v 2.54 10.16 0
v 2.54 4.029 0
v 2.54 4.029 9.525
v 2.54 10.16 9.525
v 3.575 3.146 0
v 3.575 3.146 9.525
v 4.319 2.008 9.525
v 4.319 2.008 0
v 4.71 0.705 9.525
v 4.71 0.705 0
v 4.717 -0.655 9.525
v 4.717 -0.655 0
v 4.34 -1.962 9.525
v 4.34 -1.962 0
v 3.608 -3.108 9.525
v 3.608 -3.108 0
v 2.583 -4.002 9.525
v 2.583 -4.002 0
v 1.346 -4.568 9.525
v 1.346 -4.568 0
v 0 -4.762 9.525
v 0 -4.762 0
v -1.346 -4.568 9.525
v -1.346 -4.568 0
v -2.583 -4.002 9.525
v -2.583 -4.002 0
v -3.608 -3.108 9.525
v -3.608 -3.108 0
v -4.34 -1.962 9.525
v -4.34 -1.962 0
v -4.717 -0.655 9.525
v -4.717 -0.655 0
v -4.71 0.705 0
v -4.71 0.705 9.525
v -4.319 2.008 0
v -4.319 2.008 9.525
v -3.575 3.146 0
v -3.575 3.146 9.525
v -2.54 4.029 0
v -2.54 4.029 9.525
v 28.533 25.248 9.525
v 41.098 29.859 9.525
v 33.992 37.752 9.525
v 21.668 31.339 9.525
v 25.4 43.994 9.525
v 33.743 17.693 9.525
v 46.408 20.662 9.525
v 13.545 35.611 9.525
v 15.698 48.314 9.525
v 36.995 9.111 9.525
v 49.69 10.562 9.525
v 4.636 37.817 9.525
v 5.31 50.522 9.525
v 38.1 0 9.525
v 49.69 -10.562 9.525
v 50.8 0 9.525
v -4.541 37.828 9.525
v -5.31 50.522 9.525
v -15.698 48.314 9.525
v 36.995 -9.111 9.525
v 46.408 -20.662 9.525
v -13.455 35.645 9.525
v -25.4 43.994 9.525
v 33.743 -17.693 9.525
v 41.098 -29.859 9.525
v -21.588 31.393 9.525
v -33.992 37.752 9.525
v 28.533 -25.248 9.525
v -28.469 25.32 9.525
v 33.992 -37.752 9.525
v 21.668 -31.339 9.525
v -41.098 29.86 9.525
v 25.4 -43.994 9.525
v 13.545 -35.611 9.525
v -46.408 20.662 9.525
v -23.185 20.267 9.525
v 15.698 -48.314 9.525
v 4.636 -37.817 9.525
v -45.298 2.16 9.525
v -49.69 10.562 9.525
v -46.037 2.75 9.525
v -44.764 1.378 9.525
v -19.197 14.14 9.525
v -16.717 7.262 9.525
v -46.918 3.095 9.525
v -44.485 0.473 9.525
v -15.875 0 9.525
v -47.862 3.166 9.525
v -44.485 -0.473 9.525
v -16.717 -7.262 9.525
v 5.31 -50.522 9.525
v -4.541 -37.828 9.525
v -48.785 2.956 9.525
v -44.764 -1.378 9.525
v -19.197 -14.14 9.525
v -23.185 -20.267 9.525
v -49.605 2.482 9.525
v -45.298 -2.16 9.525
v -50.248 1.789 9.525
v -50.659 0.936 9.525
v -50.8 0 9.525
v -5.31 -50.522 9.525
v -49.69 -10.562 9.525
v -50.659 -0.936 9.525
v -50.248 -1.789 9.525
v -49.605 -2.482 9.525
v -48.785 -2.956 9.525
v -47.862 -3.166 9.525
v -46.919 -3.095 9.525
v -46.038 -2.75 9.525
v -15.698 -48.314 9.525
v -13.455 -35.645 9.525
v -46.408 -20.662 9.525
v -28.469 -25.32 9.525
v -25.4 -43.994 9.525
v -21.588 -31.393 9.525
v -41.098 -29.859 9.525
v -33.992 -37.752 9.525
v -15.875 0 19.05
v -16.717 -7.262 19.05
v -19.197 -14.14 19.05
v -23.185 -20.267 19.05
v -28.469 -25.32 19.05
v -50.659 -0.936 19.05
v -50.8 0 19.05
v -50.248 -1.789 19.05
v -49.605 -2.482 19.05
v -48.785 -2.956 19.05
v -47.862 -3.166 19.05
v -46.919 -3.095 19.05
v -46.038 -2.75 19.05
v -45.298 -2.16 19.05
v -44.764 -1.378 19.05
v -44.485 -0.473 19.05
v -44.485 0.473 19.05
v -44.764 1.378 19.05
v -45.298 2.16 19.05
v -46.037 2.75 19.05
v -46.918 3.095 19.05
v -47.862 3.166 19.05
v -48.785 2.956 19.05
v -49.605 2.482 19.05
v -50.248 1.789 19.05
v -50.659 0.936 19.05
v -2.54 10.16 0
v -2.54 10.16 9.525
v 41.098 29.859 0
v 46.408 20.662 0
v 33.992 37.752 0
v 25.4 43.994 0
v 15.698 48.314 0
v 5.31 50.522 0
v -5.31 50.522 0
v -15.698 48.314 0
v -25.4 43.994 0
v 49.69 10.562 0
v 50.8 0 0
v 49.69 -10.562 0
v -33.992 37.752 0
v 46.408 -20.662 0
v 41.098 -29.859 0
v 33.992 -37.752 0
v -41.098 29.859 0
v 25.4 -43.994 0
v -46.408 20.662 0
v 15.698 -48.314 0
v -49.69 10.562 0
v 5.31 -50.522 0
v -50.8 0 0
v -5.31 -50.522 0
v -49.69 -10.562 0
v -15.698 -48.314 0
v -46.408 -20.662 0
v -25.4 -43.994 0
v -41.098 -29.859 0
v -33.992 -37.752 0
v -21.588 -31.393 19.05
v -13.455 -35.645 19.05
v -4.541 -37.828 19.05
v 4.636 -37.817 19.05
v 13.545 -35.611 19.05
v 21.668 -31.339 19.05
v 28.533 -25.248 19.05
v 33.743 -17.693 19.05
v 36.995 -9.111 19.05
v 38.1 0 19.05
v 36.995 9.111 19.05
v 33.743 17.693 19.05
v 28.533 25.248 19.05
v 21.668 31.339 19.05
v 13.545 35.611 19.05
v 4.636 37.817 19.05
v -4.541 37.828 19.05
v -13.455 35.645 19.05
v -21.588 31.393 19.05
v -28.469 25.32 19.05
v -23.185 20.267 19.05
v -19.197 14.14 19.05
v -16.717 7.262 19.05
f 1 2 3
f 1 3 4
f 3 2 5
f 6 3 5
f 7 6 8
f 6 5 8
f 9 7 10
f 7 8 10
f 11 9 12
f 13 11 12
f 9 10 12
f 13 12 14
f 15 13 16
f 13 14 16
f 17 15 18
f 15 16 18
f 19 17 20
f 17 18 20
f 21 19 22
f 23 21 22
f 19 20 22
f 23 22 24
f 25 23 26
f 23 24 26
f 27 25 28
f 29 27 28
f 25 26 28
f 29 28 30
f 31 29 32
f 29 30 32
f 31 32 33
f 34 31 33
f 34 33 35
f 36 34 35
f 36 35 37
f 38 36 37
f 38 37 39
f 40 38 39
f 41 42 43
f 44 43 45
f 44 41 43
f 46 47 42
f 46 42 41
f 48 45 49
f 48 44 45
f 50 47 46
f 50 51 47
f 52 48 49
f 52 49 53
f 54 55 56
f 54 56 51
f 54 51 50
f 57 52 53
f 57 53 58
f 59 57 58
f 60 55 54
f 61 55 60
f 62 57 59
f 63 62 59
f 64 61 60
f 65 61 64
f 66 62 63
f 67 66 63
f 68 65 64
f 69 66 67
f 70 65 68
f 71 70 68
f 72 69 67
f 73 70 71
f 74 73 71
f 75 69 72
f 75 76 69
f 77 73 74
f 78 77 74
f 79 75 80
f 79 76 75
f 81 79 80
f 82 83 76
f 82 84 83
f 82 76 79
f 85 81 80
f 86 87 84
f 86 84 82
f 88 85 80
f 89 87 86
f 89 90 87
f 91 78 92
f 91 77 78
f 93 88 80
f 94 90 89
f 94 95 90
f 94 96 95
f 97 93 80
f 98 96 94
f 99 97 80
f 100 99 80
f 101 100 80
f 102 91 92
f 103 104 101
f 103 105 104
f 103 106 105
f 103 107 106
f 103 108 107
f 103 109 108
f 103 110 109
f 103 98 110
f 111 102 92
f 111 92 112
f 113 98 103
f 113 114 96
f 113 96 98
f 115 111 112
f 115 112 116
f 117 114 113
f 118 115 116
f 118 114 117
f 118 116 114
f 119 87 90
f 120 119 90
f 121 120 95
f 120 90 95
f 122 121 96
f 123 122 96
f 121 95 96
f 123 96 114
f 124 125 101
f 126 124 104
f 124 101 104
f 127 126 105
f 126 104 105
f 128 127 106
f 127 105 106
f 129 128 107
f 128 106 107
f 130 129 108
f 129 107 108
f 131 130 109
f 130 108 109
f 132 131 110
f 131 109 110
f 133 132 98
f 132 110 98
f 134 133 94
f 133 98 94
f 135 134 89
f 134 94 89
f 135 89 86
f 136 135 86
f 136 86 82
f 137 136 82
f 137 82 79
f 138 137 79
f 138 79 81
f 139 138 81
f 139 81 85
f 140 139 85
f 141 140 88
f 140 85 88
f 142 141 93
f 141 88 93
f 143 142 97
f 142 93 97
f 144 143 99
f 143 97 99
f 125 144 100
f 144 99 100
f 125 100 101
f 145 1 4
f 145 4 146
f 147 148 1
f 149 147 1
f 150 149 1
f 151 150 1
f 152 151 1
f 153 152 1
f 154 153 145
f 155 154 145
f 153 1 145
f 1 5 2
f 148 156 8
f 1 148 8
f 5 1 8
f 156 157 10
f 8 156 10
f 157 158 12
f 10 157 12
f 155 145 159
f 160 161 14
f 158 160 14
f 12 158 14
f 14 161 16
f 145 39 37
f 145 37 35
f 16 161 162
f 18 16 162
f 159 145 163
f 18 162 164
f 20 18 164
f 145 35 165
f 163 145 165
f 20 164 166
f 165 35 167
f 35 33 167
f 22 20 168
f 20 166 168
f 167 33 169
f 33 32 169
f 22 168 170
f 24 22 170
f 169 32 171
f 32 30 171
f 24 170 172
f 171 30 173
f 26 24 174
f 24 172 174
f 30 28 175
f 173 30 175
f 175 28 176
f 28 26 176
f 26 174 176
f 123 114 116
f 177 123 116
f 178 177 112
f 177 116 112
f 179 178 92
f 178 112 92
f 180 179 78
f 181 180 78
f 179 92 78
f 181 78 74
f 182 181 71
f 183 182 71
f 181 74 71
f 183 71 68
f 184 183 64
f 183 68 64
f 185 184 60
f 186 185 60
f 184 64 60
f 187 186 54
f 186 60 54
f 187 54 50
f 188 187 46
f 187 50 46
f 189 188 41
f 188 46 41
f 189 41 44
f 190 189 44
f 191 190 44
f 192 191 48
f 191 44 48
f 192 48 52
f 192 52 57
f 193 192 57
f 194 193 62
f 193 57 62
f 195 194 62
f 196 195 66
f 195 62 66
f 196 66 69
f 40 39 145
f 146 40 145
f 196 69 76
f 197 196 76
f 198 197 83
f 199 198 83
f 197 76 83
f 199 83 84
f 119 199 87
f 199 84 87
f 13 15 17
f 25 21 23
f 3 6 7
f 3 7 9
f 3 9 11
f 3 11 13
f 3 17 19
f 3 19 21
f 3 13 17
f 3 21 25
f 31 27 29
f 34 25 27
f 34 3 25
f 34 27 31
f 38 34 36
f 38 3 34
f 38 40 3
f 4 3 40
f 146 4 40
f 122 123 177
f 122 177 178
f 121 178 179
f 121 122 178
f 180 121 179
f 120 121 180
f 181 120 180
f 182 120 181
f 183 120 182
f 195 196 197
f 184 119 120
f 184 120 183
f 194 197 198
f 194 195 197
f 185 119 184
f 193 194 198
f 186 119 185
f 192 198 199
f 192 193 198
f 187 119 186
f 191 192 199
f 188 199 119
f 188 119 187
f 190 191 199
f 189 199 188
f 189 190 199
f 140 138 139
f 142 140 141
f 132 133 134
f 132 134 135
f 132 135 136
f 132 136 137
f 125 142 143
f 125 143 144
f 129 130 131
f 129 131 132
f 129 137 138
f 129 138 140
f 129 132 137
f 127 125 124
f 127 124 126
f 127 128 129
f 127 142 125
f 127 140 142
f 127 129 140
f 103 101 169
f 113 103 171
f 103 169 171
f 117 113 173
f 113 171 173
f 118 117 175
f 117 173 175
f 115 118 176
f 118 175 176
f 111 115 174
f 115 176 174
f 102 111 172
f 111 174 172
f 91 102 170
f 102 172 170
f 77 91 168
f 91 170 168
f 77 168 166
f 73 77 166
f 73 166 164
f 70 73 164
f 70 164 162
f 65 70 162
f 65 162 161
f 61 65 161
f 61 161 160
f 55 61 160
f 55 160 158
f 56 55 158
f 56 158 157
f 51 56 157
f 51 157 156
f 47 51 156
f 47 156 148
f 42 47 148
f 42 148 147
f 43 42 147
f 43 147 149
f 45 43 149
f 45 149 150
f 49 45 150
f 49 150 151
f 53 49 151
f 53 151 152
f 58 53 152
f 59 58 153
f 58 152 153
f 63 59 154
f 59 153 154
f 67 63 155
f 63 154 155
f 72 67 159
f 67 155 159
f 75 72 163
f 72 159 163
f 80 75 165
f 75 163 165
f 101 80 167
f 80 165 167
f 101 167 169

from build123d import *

# Parameters (mm, degrees)
SKETCH1_R           = 50.8
BOSS_EXTRUDE1_DEPTH = 9.525
SKETCH2_R           = 3.175
BOSS_EXTRUDE2_DEPTH = 9.525
SKETCH7_R           = 4.7625
SKETCH7_W           = 5.08
SKETCH7_H           = 10.16
CUT_EXTRUDE10_DEPTH = 9.525


with BuildPart() as part:
    # Sketch1 → Boss-Extrude1 (new body)
    with BuildSketch(Plane.XY):
        with Locations(Location((0, 0, 0), (0, 0, 180))):
            Circle(SKETCH1_R)
    extrude(amount=BOSS_EXTRUDE1_DEPTH)

    # Sketch2 → Boss-Extrude2 (add)
    with BuildSketch(Plane.XY.offset(9.525)):
        with BuildLine():
            ThreePointArc((-28.469166667, 25.320279408), (-19.197370761, 14.139745253), (-15.875, 0))
            ThreePointArc((-15.875, 0), (-19.197370761, -14.139745253), (-28.469166667, -25.320279408))
            ThreePointArc((-28.469166667, -25.320279408), (38.1, 0), (-28.469166667, 25.320279408))
        make_face()
        with Locations(Location((-47.625, 0, 0), (0, 0, 179.999530418))):
            Circle(SKETCH2_R)
    extrude(amount=BOSS_EXTRUDE2_DEPTH)

    # Sketch7 → Cut-Extrude10 (cut)
    with BuildSketch(Plane(origin=(0, 0, 0), x_dir=(-1, 0, 0), z_dir=(0, 0, -1))):
        Circle(SKETCH7_R)
        with Locations((0, 5.08)):
            Rectangle(SKETCH7_W, SKETCH7_H)
    extrude(amount=-CUT_EXTRUDE10_DEPTH, mode=Mode.SUBTRACT)


solid = part.part
